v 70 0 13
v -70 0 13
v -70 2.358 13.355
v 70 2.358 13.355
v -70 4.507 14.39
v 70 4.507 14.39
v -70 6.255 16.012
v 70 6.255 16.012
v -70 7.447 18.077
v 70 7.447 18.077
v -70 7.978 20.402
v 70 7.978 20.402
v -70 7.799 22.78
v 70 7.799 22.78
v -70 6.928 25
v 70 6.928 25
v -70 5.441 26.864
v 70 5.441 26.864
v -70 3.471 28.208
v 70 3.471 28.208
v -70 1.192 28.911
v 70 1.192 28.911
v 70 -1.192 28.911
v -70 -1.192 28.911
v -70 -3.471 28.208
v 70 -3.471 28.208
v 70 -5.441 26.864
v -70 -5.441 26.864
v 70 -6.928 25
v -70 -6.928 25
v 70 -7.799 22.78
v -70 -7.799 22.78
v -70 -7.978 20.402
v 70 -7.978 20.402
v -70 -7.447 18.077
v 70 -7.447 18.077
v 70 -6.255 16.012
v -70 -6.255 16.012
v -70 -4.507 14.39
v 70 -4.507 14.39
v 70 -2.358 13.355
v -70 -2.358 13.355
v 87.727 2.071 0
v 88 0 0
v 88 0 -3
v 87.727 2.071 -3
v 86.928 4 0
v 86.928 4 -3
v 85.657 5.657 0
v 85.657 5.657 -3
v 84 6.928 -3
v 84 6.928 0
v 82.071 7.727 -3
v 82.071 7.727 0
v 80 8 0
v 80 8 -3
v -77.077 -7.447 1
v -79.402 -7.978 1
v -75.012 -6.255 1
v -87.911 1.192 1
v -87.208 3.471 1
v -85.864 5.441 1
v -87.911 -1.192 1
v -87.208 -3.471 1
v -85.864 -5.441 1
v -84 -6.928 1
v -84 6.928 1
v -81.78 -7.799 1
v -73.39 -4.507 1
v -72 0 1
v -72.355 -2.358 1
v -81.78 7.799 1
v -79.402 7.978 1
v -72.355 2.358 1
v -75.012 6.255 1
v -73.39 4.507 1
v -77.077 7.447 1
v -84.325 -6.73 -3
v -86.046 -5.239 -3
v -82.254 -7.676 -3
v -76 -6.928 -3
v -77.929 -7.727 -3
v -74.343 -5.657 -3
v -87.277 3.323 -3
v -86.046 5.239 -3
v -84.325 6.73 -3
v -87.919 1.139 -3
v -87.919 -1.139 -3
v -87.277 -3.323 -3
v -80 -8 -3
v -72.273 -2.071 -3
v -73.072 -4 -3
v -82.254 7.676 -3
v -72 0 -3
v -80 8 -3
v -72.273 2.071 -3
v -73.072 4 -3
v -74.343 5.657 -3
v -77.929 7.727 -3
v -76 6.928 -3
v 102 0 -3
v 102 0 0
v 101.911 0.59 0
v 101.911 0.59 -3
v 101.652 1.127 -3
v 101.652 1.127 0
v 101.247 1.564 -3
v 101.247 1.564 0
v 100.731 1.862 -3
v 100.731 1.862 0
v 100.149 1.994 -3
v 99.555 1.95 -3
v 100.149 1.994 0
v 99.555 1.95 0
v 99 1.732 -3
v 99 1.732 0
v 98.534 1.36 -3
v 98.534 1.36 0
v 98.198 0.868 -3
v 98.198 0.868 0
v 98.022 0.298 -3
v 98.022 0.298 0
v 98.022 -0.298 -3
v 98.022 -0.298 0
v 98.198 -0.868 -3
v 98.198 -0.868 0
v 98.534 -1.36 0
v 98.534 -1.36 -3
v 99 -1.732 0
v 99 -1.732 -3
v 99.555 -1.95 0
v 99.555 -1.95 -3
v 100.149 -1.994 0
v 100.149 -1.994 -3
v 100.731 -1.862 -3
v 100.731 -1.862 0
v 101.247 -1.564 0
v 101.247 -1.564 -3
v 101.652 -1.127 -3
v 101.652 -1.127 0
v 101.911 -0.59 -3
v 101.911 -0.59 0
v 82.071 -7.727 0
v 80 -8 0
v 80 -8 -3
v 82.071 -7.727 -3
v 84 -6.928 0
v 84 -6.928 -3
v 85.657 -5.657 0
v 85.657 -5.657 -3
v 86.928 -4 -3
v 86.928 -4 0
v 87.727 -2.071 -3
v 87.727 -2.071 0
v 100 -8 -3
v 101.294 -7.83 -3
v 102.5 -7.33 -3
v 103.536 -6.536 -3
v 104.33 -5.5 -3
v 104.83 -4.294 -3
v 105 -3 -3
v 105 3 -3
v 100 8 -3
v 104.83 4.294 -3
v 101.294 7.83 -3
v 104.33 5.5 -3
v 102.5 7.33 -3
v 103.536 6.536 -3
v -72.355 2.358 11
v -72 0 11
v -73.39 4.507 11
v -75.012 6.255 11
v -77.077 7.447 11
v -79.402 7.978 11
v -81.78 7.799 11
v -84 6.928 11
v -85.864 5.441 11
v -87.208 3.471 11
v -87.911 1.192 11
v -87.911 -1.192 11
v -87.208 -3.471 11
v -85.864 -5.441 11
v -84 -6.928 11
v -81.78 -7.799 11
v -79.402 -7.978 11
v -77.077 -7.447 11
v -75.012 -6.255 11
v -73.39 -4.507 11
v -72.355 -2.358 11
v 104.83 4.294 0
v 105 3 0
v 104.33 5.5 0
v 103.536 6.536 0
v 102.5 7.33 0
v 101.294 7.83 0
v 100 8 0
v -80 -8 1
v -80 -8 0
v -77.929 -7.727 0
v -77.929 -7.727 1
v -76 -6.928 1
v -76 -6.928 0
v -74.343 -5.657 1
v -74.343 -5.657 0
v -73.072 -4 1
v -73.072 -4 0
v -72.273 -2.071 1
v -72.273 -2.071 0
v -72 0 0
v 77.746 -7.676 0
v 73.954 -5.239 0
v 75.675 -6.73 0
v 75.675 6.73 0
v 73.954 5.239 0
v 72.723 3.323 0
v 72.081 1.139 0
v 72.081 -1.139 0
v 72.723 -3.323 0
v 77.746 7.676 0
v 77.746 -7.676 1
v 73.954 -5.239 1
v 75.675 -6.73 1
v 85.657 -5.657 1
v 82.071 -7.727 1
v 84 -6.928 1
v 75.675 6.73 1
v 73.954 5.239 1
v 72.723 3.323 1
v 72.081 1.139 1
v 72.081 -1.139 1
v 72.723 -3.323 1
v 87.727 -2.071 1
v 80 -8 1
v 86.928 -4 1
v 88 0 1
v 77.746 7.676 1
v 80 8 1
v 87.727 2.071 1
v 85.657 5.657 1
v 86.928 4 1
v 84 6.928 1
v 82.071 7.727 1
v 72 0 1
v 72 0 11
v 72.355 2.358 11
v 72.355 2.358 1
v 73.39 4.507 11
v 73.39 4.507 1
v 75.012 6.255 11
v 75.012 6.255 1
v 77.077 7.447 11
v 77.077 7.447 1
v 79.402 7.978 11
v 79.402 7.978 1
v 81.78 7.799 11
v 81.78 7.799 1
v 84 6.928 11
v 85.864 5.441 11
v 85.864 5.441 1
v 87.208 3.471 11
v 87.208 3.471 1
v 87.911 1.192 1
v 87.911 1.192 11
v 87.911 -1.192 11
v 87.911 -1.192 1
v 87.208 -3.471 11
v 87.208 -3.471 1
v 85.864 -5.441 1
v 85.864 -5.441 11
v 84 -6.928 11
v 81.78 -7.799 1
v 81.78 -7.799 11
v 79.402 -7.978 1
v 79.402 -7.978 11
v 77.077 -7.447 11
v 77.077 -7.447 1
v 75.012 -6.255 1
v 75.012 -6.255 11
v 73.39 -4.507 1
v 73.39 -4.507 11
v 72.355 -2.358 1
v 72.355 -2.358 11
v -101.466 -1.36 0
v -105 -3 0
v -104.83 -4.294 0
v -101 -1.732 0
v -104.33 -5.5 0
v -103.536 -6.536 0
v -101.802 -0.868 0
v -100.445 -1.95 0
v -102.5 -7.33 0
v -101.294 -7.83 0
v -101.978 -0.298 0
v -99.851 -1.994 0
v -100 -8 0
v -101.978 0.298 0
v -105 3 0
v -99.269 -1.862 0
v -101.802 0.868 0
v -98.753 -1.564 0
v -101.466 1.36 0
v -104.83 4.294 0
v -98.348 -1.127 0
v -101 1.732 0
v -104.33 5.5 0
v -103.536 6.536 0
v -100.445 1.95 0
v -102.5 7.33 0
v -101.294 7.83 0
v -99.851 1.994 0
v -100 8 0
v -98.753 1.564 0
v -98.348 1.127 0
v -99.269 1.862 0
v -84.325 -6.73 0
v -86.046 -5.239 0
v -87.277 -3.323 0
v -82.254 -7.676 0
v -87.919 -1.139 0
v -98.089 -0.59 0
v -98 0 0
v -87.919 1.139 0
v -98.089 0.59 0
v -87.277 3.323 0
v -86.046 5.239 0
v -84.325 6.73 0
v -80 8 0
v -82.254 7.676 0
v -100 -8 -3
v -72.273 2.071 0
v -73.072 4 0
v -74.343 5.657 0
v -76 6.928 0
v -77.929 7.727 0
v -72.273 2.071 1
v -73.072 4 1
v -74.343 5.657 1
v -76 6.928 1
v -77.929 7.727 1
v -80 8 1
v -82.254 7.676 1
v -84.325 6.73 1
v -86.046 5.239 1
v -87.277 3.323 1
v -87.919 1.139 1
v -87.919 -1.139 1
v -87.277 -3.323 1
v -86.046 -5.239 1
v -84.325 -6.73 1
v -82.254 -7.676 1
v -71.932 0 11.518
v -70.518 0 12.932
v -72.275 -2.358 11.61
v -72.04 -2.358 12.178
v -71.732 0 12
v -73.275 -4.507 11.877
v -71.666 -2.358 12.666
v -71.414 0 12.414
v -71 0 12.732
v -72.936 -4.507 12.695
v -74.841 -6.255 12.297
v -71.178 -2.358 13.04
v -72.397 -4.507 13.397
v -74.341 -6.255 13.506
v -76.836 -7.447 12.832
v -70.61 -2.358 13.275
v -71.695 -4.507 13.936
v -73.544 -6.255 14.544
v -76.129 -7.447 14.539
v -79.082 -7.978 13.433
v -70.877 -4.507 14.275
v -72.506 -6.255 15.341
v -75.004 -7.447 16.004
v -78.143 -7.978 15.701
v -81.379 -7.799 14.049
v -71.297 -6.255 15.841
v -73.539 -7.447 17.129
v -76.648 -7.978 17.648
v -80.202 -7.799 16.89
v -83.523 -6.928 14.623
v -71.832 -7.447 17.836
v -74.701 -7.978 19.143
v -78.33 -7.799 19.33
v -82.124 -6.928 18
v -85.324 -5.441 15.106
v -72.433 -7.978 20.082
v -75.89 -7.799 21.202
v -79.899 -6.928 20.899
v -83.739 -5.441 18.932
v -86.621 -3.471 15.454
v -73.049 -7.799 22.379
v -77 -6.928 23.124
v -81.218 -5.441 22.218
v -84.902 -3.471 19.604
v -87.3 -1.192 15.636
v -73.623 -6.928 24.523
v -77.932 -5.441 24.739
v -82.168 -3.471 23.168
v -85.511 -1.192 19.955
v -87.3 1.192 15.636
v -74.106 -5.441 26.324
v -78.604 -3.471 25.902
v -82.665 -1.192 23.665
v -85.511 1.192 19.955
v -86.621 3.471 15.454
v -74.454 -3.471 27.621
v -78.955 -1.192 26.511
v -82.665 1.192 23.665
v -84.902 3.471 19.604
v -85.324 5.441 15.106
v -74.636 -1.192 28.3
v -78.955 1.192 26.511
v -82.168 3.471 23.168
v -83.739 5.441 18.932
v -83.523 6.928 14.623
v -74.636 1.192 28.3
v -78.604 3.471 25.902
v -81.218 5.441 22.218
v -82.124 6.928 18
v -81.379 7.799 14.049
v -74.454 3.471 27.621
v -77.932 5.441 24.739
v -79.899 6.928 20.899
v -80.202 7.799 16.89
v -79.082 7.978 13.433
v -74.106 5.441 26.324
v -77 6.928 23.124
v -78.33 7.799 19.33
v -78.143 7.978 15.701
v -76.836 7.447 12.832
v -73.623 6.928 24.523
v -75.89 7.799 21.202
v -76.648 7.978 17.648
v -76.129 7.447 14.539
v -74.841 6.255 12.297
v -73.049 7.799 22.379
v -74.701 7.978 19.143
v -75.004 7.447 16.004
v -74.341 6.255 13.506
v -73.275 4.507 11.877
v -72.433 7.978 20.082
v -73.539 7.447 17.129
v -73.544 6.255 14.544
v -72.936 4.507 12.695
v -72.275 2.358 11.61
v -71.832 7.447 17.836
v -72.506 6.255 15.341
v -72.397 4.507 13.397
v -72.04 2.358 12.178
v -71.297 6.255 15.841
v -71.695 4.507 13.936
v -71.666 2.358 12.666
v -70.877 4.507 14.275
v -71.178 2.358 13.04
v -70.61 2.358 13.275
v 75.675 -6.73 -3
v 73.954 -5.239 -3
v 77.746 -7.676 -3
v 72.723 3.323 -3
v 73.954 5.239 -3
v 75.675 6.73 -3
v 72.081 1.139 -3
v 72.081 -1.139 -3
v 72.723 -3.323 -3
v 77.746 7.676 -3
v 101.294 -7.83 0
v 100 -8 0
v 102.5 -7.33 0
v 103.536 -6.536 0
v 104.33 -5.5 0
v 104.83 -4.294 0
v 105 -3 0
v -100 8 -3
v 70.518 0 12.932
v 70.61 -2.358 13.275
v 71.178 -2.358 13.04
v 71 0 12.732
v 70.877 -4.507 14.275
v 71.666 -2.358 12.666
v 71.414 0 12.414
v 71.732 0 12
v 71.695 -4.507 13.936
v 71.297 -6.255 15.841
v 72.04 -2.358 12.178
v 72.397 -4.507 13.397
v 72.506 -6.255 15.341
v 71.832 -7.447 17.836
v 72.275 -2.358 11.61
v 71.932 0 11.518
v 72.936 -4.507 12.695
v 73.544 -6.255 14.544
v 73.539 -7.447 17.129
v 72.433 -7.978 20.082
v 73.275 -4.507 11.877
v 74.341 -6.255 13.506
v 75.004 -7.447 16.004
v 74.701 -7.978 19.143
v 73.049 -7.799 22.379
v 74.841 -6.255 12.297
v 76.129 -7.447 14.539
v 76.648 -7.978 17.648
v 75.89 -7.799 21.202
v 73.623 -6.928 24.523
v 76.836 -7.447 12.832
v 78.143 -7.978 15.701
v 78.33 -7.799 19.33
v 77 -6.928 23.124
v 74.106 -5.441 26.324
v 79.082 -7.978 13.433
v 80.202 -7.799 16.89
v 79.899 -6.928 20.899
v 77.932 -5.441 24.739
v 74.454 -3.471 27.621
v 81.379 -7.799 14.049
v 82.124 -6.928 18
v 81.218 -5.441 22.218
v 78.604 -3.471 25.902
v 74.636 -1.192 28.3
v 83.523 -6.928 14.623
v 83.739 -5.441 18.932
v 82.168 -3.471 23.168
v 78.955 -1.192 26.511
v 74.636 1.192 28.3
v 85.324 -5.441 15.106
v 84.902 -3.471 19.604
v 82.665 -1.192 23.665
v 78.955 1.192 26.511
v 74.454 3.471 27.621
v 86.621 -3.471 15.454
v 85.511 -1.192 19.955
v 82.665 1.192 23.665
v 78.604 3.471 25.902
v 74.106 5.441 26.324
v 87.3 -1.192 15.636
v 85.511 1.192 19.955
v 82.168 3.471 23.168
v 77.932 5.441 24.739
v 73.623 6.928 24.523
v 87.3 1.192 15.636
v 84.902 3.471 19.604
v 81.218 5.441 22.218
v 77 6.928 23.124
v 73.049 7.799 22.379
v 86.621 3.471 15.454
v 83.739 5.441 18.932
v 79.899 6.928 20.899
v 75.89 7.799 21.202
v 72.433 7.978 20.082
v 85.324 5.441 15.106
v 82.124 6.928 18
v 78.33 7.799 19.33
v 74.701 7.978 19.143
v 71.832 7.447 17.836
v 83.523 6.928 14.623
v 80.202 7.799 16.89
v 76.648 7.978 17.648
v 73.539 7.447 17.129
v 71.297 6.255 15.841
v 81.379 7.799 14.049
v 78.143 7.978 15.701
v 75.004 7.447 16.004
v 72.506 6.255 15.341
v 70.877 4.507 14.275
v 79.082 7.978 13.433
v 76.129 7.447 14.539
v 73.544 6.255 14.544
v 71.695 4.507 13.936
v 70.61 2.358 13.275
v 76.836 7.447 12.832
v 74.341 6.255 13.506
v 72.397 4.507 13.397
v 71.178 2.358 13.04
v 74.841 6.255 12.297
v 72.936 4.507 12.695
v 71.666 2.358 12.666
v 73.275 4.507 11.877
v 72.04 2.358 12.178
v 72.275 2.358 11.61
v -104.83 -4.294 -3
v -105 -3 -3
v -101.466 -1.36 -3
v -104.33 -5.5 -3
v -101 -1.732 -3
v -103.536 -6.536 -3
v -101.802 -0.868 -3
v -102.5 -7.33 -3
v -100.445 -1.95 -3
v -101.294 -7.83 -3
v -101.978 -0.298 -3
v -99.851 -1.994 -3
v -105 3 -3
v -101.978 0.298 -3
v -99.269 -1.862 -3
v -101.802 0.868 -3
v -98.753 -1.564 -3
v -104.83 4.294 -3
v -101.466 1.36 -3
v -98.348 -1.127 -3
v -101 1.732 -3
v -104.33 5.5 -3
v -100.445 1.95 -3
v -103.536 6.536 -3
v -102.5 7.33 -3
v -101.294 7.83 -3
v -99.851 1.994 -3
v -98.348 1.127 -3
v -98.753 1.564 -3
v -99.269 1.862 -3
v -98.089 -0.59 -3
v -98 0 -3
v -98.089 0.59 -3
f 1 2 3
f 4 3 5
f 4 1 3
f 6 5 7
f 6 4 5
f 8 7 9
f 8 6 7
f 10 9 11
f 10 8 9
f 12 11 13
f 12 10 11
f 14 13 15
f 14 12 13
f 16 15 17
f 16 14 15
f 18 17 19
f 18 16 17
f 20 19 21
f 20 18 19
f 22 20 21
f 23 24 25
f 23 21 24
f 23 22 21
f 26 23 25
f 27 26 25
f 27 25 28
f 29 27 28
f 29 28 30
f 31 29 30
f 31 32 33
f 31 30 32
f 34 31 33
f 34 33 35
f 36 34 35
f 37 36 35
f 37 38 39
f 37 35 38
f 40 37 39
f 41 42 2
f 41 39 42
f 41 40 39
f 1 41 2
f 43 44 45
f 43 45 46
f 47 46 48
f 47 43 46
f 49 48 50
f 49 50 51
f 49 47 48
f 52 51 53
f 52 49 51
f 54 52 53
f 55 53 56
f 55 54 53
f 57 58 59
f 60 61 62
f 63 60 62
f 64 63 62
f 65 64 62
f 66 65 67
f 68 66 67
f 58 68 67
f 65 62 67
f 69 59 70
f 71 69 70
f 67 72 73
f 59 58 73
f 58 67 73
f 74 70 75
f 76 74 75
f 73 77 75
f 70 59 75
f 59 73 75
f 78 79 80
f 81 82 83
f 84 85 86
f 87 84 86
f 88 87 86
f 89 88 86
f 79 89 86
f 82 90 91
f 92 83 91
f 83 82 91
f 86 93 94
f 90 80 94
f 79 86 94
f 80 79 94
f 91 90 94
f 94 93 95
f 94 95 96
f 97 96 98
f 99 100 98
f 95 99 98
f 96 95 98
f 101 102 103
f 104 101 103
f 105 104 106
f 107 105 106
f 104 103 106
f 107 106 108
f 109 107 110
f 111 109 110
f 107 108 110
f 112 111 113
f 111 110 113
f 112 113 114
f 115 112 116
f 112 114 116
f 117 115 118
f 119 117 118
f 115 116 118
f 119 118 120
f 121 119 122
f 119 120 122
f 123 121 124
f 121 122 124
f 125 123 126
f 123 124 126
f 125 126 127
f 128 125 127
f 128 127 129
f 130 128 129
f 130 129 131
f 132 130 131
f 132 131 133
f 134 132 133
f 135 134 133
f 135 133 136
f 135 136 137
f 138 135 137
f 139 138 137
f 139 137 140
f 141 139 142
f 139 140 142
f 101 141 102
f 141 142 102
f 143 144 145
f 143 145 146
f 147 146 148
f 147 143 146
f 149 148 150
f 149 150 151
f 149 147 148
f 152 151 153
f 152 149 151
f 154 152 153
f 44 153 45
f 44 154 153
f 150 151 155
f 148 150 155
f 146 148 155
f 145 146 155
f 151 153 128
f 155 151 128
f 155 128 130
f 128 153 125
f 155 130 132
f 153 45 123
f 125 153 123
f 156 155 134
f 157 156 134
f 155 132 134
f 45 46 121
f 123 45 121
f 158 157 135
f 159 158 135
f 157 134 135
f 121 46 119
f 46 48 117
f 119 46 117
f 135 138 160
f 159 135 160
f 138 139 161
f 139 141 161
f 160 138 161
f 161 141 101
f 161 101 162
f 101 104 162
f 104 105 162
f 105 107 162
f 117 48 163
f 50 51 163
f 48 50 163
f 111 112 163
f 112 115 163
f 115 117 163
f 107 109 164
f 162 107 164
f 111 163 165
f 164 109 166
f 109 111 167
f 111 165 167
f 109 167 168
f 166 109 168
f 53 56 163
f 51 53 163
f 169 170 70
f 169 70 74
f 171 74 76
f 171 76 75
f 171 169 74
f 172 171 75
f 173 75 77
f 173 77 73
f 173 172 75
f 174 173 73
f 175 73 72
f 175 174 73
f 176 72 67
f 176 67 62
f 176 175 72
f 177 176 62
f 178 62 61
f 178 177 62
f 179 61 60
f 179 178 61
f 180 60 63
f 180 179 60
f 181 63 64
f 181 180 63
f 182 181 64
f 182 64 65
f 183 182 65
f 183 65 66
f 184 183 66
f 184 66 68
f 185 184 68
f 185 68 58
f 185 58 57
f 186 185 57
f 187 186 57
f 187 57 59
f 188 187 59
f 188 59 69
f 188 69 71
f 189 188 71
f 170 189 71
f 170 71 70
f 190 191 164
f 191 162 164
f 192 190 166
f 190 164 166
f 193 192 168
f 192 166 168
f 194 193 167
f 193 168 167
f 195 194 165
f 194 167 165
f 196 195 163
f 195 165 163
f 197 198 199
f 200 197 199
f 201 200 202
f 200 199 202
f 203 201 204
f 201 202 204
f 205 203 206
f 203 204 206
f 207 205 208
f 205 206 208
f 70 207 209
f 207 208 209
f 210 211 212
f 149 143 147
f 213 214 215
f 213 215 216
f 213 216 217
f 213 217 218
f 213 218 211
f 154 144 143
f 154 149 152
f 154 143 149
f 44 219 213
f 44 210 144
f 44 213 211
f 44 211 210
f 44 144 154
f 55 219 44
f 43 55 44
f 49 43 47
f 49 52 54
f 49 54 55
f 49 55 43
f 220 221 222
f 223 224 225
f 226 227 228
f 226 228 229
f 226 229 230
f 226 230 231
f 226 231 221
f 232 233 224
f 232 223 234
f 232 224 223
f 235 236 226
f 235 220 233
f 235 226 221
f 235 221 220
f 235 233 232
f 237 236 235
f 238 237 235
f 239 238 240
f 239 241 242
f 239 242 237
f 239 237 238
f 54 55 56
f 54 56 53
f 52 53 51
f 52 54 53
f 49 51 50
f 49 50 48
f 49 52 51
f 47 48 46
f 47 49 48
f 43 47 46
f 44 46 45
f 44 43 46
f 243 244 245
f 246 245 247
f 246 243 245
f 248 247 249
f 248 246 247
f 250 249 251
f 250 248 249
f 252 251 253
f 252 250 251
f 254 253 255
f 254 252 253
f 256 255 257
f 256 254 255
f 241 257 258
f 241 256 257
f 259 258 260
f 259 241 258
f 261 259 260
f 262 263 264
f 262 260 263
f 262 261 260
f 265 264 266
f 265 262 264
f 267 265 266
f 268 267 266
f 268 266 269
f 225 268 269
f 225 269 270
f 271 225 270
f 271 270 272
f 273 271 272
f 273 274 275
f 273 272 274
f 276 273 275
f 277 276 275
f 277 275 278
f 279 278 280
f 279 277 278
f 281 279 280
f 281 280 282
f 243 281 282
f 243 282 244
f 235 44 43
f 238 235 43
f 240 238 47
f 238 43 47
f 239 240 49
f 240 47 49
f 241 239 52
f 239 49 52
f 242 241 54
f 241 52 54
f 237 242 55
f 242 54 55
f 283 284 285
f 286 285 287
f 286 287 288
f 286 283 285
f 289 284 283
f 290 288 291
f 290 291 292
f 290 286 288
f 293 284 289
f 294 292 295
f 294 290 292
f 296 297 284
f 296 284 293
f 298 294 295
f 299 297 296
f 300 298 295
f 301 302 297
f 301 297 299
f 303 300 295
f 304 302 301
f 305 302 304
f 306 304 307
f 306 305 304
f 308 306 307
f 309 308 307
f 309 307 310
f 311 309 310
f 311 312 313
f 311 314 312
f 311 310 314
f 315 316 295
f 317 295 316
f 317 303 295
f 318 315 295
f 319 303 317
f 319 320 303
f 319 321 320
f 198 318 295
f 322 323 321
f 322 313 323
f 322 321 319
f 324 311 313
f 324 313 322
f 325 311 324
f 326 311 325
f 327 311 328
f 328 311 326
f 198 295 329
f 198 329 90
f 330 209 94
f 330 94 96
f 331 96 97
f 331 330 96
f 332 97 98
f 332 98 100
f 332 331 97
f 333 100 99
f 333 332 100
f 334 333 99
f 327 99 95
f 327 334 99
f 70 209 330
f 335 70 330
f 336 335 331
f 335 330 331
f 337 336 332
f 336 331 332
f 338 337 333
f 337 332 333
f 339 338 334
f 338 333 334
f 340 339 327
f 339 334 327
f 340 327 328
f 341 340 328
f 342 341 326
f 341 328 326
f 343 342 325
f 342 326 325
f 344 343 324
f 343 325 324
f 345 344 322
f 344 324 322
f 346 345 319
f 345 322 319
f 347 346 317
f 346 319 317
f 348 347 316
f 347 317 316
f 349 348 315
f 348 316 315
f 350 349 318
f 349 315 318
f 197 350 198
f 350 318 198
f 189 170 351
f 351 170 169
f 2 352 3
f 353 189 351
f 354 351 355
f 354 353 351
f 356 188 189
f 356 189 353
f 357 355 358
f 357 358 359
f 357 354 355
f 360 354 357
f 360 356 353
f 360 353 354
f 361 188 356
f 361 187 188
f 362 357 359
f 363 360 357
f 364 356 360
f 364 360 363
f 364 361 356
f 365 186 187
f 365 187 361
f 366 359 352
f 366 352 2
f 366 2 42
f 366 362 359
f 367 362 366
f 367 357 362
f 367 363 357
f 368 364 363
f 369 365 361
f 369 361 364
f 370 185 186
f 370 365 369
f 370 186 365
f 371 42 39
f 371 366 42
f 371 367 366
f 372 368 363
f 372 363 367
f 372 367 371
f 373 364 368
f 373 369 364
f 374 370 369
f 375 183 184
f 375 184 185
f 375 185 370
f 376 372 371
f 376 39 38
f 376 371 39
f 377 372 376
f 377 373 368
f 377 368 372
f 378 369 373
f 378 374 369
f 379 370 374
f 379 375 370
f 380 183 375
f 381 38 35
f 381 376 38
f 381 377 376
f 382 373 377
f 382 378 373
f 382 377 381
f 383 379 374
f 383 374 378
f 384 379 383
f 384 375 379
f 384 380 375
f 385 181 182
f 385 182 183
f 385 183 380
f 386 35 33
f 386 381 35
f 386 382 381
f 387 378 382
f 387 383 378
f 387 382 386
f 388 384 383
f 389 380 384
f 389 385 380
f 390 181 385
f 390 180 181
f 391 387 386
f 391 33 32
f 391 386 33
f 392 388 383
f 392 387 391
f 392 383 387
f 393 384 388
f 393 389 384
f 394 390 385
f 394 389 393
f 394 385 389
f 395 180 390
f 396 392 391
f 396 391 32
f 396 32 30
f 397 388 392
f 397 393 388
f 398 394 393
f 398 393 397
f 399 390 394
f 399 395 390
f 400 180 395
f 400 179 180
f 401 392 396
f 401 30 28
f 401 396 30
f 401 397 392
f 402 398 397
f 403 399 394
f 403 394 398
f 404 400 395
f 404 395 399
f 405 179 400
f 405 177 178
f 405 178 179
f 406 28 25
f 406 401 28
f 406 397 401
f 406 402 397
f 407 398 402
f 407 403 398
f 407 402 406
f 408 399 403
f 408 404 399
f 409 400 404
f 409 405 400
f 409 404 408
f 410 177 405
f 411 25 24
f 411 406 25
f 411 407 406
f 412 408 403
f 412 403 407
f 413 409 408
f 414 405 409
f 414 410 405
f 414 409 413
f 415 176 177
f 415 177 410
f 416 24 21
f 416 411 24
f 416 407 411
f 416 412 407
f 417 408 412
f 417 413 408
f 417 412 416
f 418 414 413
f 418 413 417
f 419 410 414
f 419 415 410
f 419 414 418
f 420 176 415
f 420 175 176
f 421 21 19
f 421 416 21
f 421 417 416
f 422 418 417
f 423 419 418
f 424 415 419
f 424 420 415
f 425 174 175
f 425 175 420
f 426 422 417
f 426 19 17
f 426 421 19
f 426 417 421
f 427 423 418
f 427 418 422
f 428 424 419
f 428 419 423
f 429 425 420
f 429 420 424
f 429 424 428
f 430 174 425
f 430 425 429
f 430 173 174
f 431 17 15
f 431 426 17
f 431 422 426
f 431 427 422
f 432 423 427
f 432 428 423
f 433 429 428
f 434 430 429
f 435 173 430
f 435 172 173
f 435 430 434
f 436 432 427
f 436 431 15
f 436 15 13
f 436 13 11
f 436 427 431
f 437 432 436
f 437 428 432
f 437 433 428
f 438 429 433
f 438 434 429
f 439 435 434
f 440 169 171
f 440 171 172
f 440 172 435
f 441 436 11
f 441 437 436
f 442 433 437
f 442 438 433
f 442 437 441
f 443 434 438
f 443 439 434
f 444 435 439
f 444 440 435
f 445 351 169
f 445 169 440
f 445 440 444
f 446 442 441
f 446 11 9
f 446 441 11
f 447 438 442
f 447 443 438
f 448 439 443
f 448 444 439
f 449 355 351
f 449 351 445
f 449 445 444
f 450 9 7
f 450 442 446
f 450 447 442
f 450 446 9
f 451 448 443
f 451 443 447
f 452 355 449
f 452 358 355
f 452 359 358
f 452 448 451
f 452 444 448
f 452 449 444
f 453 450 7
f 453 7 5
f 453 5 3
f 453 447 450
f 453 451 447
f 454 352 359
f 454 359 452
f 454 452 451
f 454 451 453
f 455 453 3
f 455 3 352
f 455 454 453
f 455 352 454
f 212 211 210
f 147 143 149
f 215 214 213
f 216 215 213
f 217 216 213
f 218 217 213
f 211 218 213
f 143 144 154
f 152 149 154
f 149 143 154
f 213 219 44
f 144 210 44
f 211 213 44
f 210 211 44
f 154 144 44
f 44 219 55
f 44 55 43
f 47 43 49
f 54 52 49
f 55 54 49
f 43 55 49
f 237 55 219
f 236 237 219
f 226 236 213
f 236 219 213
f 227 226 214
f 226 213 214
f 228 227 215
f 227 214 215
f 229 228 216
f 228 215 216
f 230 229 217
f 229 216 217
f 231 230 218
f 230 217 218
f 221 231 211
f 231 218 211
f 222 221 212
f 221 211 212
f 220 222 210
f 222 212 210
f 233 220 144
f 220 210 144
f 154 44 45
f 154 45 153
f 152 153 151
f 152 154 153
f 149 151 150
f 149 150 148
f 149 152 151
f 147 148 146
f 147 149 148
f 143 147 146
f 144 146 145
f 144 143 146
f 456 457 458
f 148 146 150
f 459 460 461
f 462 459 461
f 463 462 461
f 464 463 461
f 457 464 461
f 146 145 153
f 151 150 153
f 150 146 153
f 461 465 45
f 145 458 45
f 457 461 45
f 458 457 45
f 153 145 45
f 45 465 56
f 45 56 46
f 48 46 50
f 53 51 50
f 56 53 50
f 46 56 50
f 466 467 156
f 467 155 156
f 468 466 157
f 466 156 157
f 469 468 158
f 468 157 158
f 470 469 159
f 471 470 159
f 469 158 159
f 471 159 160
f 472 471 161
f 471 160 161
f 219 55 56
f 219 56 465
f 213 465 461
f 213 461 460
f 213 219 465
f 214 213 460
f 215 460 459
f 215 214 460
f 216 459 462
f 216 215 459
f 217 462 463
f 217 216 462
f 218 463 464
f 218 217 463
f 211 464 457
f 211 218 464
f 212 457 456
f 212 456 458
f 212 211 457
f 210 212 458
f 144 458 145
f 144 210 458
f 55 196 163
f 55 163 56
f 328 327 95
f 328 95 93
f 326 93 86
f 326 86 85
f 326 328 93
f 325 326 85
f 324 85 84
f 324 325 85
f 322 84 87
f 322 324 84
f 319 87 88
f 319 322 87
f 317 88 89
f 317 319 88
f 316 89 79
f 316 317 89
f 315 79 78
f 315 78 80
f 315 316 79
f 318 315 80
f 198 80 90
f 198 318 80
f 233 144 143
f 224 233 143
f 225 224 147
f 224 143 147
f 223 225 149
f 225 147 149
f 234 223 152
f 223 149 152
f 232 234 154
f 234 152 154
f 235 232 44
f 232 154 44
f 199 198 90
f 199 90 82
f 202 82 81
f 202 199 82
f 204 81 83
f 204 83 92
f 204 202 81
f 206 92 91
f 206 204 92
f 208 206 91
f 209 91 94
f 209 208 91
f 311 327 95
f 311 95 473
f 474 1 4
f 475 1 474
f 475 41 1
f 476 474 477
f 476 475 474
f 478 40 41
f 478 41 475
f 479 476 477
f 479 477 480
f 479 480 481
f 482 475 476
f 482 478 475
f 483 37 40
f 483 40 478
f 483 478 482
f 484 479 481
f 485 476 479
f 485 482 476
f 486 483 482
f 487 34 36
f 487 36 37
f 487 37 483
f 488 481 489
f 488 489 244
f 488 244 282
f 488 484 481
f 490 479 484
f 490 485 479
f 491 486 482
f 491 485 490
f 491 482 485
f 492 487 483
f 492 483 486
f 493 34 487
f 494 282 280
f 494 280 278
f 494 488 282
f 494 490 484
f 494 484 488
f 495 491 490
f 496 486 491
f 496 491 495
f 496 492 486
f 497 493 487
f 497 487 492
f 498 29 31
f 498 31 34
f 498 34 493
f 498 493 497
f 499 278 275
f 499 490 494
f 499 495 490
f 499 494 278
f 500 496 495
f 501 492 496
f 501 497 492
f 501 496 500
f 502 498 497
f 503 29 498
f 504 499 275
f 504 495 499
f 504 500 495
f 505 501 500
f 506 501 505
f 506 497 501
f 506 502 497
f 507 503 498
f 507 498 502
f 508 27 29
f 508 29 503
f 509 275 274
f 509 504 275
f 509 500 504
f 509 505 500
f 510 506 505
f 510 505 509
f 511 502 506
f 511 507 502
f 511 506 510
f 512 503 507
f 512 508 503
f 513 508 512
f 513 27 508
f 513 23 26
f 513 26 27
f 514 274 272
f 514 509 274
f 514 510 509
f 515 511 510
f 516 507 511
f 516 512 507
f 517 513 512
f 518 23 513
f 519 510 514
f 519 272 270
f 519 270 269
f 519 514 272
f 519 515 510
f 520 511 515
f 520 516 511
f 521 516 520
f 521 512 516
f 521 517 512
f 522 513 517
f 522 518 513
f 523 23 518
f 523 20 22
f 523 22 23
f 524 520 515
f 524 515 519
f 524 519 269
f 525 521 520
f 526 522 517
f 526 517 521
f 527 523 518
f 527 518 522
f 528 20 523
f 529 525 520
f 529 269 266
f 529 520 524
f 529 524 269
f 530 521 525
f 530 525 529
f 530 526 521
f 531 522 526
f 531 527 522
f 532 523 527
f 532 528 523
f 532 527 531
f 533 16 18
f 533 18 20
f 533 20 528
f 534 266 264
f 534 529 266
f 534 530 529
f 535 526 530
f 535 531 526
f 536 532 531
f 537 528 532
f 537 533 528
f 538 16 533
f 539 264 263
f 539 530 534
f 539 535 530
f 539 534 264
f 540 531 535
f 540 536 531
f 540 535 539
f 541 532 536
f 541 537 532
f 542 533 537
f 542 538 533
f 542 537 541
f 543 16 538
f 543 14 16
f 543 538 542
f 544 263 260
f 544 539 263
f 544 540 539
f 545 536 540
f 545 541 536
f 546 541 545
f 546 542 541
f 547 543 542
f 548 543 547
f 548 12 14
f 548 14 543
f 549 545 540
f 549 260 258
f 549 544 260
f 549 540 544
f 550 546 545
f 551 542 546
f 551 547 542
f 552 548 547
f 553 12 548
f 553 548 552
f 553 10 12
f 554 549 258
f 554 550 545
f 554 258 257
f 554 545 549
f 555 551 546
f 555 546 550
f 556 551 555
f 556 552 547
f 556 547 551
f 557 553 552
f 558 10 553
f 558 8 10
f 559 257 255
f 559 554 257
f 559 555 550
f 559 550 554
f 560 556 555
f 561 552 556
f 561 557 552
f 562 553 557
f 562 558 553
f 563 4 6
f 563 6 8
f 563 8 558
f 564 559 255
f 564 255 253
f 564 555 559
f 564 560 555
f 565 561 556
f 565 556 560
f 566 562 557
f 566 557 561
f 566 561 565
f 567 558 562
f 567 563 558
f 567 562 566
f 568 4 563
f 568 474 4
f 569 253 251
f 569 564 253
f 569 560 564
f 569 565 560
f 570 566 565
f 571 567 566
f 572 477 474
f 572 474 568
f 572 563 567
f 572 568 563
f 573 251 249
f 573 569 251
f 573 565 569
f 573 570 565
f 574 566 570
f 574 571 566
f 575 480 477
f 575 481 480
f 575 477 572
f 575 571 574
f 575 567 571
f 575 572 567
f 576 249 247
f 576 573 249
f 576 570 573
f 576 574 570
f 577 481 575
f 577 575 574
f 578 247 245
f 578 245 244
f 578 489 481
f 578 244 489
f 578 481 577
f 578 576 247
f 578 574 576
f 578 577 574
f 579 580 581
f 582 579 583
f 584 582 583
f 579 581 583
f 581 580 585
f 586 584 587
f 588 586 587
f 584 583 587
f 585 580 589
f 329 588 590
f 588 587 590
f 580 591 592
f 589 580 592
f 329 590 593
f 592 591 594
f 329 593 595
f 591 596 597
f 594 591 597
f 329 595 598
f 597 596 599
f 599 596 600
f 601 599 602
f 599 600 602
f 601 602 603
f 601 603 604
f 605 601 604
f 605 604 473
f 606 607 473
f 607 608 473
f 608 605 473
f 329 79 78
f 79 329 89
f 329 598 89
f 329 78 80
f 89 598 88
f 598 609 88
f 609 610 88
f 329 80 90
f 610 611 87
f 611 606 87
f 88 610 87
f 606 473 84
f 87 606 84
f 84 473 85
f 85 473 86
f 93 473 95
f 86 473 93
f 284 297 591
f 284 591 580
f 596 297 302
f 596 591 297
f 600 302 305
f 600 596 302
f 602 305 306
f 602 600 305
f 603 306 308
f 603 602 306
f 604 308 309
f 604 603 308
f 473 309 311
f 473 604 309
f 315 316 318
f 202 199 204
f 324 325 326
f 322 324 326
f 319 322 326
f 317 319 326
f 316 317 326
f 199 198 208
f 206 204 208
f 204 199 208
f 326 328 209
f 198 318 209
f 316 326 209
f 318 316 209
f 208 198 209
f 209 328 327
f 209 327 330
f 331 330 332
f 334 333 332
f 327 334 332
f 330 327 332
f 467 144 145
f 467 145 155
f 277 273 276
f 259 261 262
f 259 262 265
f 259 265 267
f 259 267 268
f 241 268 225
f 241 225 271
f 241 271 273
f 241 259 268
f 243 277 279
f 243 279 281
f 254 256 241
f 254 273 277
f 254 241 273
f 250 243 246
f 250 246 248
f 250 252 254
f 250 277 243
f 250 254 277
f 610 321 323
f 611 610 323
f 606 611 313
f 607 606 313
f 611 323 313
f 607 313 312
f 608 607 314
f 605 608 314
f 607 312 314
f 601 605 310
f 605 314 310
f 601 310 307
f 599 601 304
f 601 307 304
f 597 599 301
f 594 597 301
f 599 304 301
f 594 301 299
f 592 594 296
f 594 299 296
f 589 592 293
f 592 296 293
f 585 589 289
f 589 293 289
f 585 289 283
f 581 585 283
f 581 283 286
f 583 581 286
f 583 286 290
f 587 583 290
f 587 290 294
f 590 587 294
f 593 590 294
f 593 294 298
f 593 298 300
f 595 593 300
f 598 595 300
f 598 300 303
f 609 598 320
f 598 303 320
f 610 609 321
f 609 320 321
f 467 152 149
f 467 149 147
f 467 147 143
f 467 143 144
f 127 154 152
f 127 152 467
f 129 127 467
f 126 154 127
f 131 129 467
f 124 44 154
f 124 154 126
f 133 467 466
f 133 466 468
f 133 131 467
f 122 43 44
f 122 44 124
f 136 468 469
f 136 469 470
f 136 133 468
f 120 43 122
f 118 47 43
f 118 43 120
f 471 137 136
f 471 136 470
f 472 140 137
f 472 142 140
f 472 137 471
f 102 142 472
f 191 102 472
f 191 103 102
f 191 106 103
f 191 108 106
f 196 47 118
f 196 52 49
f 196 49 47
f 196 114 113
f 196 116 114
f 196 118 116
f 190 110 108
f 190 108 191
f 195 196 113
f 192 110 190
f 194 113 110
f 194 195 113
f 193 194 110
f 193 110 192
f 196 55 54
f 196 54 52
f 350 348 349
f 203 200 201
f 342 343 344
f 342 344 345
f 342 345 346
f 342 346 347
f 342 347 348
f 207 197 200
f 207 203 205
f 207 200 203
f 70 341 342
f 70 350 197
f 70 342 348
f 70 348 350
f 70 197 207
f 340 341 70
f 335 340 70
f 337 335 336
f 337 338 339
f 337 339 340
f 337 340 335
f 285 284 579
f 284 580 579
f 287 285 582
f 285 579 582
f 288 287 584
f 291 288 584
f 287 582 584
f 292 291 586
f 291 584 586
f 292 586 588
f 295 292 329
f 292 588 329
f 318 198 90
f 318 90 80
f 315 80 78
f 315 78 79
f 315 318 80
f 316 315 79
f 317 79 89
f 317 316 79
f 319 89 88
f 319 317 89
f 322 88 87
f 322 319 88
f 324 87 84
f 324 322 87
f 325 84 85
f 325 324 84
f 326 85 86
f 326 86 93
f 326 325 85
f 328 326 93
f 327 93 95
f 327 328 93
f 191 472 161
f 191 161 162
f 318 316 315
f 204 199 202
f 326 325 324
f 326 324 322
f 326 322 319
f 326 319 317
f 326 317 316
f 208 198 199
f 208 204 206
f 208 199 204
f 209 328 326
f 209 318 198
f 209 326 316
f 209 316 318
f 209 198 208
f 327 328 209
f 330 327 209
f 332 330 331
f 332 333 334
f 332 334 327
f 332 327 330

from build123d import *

# Parameters (mm, degrees)
F1_DEPTH  = 1
F0_R      = 2
F2_DEPTH  = 3
F3_DEPTH  = 3
F1_FACE_R = 8
F6_R      = 5
F6_2_R    = 5


with BuildPart() as f1:
    # F0 (on Top) → F1 (new body)
    with BuildSketch(Plane.XY):
        with BuildLine():
            ThreePointArc((-80, 8), (-88, 0), (-80, -8))
            ThreePointArc((-80, -8), (-74.3431457505, -5.6568542495), (-72, 0))
            ThreePointArc((-72, 0), (-74.3431457505, 5.6568542495), (-80, 8))
        make_face()
    extrude(amount=F1_DEPTH)


with BuildPart() as f1b:
    # F0 (on Top) → F1, piece 2 (new body)
    with BuildSketch(Plane.XY):
        with BuildLine():
            ThreePointArc((80, 8), (72, 0), (80, -8))
            ThreePointArc((80, -8), (85.6568542495, -5.6568542495), (88, 0))
            ThreePointArc((88, 0), (85.6568542495, 5.6568542495), (80, 8))
        make_face()
    extrude(amount=F1_DEPTH)


with BuildPart() as f2:
    # F0 (on Top) → F2 (new body)
    with BuildSketch(Plane.XY):
        with BuildLine():
            Line((-105, 8), (-105, -8))
            Line((-105, -8), (-80, -8))
            ThreePointArc((-80, -8), (-88, 0), (-80, 8))
            Line((-80, 8), (-105, 8))
        make_face()
        with Locations((-100, 0)):
            Circle(F0_R, mode=Mode.SUBTRACT)
    extrude(amount=-F2_DEPTH)

    # F6
    f6_edges = [f2.edges().sort_by_distance(p)[0] for p in [
        (-105, -8, -1.5),
        (-105, 8, -1.5),
    ]]
    fillet(f6_edges, radius=F6_R)


with BuildPart() as f2b:
    # F0 (on Top) → F2, piece 2 (new body)
    with BuildSketch(Plane.XY):
        with BuildLine():
            Line((80, -8), (105, -8))
            Line((105, -8), (105, 8))
            Line((105, 8), (80, 8))
            ThreePointArc((80, 8), (85.6568542495, 5.6568542495), (88, 0))
            ThreePointArc((88, 0), (85.6568542495, -5.6568542495), (80, -8))
        make_face()
        with Locations((100, 0)):
            Circle(F0_R, mode=Mode.SUBTRACT)
    extrude(amount=-F2_DEPTH)

    # F6#2
    f6_2_edges = [f2b.edges().sort_by_distance(p)[0] for p in [
        (105, -8, -1.5),
        (105, 8, -1.5),
    ]]
    fillet(f6_2_edges, radius=F6_2_R)


with BuildPart() as f3:
    # F0 (on Top) → F3 (new body)
    with BuildSketch(Plane.XY):
        with BuildLine():
            ThreePointArc((-80, 8), (-88, 0), (-80, -8))
            ThreePointArc((-80, -8), (-74.3431457505, -5.6568542495), (-72, 0))
            ThreePointArc((-72, 0), (-74.3431457505, 5.6568542495), (-80, 8))
        make_face()
    extrude(amount=-F3_DEPTH)


with BuildPart() as f3b:
    # F0 (on Top) → F3, piece 2 (new body)
    with BuildSketch(Plane.XY):
        with BuildLine():
            ThreePointArc((80, 8), (72, 0), (80, -8))
            ThreePointArc((80, -8), (85.6568542495, -5.6568542495), (88, 0))
            ThreePointArc((88, 0), (85.6568542495, 5.6568542495), (80, 8))
        make_face()
    extrude(amount=-F3_DEPTH)


with BuildPart() as f5:
    # F5: sweep along a path in F4
    with BuildLine(Plane.XZ) as f5_path:
        Line((-80, 1), (-80, 11))
        ThreePointArc((-80, 11), (-77.0710678119, 18.0710678119), (-70, 21))
        Line((-70, 21), (0, 21))
        Line((0, 21), (70, 21))
        ThreePointArc((70, 21), (77.0710678119, 18.0710678119), (80, 11))
        Line((80, 11), (80, 1))
    # F1_face (on face) → F5 (sweep)
    with BuildSketch(Plane(origin=(-80, 0, 1), x_dir=(1, 0, 0), z_dir=(0, 0, 1))):
        Circle(F1_FACE_R)
    sweep(path=f5_path.line)


solid = Compound([f1.part, f1b.part, f2.part, f2b.part, f3.part, f3b.part, f5.part])
